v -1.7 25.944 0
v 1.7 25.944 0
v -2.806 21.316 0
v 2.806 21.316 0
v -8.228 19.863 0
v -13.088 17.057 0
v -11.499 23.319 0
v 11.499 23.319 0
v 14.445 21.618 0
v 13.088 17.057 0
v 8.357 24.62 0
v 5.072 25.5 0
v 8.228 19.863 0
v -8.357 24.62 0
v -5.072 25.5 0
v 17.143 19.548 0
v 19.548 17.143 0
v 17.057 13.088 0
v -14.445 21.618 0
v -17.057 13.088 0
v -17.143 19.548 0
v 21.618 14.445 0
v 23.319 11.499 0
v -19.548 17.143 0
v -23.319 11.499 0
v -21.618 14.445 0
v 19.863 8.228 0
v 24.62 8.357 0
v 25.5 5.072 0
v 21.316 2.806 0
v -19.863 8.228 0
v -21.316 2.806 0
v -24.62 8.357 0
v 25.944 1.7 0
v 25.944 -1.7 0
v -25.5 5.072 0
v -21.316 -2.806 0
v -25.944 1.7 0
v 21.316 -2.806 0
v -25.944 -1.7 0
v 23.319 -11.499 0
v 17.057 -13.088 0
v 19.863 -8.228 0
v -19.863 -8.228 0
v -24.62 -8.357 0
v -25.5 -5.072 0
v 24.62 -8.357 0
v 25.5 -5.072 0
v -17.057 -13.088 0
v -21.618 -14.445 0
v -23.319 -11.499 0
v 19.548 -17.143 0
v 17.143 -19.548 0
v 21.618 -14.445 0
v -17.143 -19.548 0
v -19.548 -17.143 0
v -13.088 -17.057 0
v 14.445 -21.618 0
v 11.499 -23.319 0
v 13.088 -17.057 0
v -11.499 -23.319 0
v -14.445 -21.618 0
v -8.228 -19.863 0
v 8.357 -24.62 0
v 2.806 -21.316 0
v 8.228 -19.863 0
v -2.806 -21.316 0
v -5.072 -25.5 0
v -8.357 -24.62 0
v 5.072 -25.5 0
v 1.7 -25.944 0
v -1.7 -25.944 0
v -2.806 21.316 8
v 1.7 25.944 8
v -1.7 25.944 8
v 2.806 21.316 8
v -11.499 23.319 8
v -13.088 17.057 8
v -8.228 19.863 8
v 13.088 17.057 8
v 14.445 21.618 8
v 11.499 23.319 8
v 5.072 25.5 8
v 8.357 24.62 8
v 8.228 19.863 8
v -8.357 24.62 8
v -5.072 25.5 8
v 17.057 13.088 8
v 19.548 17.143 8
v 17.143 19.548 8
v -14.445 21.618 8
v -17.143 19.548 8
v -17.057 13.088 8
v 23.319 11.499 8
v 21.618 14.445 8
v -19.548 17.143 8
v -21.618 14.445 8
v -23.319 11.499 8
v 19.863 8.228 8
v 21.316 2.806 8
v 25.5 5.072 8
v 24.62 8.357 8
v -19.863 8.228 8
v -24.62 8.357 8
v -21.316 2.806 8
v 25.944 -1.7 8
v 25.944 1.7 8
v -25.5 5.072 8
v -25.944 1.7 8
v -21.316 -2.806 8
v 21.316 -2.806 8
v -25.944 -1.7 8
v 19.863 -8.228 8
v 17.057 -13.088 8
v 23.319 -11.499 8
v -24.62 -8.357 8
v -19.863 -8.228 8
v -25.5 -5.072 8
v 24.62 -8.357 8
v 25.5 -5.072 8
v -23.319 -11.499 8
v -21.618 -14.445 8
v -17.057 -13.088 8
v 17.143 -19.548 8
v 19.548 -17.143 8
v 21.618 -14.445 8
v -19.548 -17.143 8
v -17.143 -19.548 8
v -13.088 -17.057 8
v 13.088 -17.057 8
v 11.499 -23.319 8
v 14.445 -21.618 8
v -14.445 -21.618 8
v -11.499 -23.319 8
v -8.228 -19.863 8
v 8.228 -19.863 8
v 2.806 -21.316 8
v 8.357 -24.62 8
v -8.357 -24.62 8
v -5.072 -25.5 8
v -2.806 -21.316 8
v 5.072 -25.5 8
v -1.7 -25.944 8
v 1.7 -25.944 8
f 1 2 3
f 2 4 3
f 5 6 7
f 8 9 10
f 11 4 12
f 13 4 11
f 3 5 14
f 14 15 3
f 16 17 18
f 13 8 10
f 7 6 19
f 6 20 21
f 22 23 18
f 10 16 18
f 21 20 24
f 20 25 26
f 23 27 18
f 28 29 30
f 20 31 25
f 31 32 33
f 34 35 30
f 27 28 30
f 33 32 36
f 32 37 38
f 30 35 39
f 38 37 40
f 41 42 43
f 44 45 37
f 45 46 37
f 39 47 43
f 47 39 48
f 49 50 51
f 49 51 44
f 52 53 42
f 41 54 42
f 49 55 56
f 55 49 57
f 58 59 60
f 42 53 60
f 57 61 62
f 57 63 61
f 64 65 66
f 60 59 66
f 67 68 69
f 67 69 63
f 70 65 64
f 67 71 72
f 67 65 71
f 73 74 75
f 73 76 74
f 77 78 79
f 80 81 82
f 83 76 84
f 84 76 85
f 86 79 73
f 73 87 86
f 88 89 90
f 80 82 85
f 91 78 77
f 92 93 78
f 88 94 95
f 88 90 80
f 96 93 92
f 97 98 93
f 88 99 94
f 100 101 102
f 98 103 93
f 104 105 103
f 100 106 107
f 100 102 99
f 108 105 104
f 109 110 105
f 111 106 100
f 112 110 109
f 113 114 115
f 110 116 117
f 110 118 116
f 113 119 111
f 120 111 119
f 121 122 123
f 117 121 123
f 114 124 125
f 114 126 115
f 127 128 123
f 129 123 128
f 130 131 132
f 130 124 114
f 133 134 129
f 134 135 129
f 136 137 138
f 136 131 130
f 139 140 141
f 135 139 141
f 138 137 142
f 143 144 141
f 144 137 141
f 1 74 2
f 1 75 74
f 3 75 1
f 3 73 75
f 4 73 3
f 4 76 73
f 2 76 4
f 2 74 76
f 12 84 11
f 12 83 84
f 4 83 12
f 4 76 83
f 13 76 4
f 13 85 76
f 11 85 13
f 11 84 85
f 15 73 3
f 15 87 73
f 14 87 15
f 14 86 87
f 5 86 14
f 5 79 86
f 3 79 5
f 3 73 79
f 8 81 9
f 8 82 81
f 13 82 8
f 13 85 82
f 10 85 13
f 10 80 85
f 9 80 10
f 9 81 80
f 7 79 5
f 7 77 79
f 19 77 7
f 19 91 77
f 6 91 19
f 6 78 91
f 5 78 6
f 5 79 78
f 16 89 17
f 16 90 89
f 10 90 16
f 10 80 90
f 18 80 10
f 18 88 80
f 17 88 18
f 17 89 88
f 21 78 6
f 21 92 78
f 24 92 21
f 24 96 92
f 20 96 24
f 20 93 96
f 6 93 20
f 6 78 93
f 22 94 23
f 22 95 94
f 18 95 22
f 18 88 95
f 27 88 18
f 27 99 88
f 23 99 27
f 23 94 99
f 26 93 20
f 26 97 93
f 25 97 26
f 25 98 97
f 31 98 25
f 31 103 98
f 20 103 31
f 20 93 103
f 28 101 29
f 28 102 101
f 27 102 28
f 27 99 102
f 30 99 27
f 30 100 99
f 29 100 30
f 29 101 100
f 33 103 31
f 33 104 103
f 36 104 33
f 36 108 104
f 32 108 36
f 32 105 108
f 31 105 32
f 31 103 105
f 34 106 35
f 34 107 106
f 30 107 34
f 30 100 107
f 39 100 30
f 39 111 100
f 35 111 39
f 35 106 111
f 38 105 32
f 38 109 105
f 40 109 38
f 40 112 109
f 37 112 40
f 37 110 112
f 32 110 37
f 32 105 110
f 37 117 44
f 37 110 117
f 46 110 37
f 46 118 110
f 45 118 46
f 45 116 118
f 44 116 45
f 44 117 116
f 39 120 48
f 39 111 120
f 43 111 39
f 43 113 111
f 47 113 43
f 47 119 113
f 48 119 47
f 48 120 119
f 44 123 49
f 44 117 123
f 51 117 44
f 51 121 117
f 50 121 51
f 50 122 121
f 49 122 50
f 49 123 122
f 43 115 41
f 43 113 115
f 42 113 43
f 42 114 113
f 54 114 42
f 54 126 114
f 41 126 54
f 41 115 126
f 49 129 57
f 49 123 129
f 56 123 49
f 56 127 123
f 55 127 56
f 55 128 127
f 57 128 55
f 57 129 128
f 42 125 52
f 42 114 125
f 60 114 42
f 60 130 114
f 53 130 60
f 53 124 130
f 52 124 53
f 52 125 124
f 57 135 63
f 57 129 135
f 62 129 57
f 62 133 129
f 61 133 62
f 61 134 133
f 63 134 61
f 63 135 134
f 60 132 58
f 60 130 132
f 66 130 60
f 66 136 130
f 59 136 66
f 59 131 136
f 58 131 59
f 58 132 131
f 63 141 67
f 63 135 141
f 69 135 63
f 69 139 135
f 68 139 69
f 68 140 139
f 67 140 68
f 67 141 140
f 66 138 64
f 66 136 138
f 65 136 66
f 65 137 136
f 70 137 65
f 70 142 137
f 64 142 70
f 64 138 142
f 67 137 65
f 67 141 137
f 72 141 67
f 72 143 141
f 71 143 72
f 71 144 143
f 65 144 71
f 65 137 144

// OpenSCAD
// ============================================================
// SPUR GEAR — CLEAN TEMPLATE (arc-based tooth, printable)
// ============================================================
// Naming conventions:
// - snake_case for variables and parameters
// - avoid OpenSCAD reserved words (e.g., DO NOT name a parameter "module")
// - degrees for trig (OpenSCAD sin/cos use degrees)
// - all lengths assumed millimeters
//
// UI metadata for your generator:
// param: teeth=24, modul=2, thickness=8, bore_diam=5, $fn_gear=128
// CALL:
gear(teeth=24, modul=2, thickness=8, bore_diam=5, $fn_gear=128);

// --------------------------- Public API ---------------------------
/**
 * gear()
 * @param teeth       : integer >= 6 (fewer can look degenerate with simple teeth)
 * @param modul       : ISO gear module (mm per tooth). NOT named "module" to avoid keyword clash.
 * @param thickness   : extrusion height (mm)
 * @param bore_diam   : center hole (mm)
 * @param $fn_gear    : circle resolution for smoother arcs (overrides $fn locally)
 *
 * Notes:
 * - This is a simple, printable tooth outline using arcs (not true involute). Good for demos.
 * - For realistic loads/meshing, switch to an involute version later.
 */
module gear(teeth=24, modul=2, thickness=8, bore_diam=5, $fn_gear=128)
{
    // ------------ Lightweight argument checks (avoid hard failures) ------------
    valid_teeth     = (teeth >= 6);
    valid_modul     = (modul > 0);
    valid_thickness = (thickness > 0);
    valid_bore      = (bore_diam >= 0);

    // You can flip these to "assert(...)" if you prefer hard stops:
    if (!valid_teeth)     echo("[WARN] teeth should be >= 6 for a clean outline.");
    if (!valid_modul)     echo("[WARN] modul must be > 0.");
    if (!valid_thickness) echo("[WARN] thickness must be > 0.");
    if (!valid_bore)      echo("[WARN] bore_diam must be >= 0.");

    // ------------ Derived geometry (ISO-ish defaults) ------------
    m = modul;
    z = teeth;

    pitch_radius     = 0.5 * m * z;       // r_p
    addendum_radius  = pitch_radius + m;  // r_a
    dedendum_factor  = 1.25;              // common approximation
    root_radius_raw  = pitch_radius - dedendum_factor * m;
    root_radius      = (root_radius_raw < 0.1) ? 0.1 : root_radius_raw; // avoid negatives

    // Tooth angular half-width at pitch circle (degrees).
    // This arc-based tooth centers a wedge around the tooth centerline.
    half_tooth_deg   = 180 / z;

    // local resolution for smooth circles
    gear_fn = $fn_gear;

    // ------------ Build 3D ------------
    // Use local $fn inside scope (OpenSCAD respects lexical $fn)
    // 'difference' to subtract the bore
    // linear_extrude is centered at z=0..thickness
    $fn = gear_fn;
    linear_extrude(height = thickness)
        difference() {
            gear_2d(z, pitch_radius, addendum_radius, root_radius, half_tooth_deg);
            if (bore_diam > 0)
                circle(d = bore_diam);
        }
}

// --------------------------- Internal: 2D outline ---------------------------
/**
 * gear_2d()
 * Builds a 2D gear via repeated single-tooth wedges around the origin.
 */
module gear_2d(teeth_count, pitch_radius, addendum_radius, root_radius, half_tooth_deg)
{
    tooth_step_deg = 360 / teeth_count;
    union() {
        for (i = [0 : teeth_count - 1])
            rotate(i * tooth_step_deg)
                single_tooth(addendum_radius, root_radius, half_tooth_deg);
    }
}

/**
 * single_tooth()
 * Simple wedge-like tooth made of four arc points.
 * NOTE: This is an approximation (not a true involute).
 */
module single_tooth(addendum_radius, root_radius, half_angle_deg)
{
    // Four key points: root−, tip−, tip+, root+
    pts = [
        [ root_radius * cos(-half_angle_deg),     root_radius * sin(-half_angle_deg)     ],
        [ addendum_radius * cos(-half_angle_deg/2), addendum_radius * sin(-half_angle_deg/2) ],
        [ addendum_radius * cos( half_angle_deg/2), addendum_radius * sin( half_angle_deg/2) ],
        [ root_radius * cos( half_angle_deg),     root_radius * sin( half_angle_deg)     ]
    ];
    polygon(points = pts);
}
